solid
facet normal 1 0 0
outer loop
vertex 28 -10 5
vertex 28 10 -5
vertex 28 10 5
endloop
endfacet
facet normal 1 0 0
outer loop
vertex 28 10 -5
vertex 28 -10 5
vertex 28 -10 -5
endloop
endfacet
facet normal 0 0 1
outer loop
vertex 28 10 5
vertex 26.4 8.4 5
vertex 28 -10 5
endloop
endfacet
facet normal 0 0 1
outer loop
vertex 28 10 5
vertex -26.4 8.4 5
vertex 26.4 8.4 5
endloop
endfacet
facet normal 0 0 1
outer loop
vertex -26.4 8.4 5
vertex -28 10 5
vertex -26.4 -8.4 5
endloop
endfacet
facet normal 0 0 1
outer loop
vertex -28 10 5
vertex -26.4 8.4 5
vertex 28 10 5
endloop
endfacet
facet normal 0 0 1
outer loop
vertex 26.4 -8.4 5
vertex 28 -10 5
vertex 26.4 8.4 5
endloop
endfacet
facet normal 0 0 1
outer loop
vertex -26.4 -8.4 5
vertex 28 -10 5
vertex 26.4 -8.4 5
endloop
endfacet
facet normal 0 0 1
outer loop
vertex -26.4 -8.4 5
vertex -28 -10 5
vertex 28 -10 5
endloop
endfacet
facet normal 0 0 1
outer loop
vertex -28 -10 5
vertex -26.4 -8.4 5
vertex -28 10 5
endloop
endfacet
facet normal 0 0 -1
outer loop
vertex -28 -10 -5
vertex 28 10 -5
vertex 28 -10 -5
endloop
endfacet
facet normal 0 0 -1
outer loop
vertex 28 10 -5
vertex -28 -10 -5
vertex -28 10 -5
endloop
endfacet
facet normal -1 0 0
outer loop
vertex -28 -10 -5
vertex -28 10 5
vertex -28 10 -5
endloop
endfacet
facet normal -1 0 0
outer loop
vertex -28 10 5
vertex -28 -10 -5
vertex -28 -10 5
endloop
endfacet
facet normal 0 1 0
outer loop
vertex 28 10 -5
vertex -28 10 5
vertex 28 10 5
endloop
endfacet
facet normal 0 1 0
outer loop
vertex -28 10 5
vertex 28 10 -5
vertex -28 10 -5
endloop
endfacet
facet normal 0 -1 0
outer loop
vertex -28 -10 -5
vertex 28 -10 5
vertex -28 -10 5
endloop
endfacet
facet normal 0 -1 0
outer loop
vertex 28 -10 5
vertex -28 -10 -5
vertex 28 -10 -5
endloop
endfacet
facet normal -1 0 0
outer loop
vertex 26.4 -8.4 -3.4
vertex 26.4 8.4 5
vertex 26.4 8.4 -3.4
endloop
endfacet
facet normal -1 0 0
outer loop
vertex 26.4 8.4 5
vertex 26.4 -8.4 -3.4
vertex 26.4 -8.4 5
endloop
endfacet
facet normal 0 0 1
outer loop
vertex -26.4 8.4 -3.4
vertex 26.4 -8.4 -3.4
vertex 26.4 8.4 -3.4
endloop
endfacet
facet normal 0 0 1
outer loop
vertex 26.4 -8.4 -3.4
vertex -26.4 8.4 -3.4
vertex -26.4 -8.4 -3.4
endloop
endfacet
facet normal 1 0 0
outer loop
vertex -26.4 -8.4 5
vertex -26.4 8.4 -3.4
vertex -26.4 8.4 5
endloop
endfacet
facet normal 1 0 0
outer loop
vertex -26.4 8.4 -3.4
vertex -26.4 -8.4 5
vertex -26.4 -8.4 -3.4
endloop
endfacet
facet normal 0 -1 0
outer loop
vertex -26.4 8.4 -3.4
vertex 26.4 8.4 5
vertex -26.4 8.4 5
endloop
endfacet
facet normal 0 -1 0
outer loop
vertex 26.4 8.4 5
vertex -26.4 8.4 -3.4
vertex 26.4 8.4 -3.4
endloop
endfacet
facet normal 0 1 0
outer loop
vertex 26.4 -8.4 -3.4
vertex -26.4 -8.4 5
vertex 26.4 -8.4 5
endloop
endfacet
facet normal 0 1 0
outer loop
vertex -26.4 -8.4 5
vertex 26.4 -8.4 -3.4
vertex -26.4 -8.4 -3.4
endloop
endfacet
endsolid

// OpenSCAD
w=56;
h=10;
d=20;

t=1.6;

difference(){
    cube([w,d,h], true);  
    translate([0,0,t])  
    #cube([w-t*2,d-t*2,h],true);
}
